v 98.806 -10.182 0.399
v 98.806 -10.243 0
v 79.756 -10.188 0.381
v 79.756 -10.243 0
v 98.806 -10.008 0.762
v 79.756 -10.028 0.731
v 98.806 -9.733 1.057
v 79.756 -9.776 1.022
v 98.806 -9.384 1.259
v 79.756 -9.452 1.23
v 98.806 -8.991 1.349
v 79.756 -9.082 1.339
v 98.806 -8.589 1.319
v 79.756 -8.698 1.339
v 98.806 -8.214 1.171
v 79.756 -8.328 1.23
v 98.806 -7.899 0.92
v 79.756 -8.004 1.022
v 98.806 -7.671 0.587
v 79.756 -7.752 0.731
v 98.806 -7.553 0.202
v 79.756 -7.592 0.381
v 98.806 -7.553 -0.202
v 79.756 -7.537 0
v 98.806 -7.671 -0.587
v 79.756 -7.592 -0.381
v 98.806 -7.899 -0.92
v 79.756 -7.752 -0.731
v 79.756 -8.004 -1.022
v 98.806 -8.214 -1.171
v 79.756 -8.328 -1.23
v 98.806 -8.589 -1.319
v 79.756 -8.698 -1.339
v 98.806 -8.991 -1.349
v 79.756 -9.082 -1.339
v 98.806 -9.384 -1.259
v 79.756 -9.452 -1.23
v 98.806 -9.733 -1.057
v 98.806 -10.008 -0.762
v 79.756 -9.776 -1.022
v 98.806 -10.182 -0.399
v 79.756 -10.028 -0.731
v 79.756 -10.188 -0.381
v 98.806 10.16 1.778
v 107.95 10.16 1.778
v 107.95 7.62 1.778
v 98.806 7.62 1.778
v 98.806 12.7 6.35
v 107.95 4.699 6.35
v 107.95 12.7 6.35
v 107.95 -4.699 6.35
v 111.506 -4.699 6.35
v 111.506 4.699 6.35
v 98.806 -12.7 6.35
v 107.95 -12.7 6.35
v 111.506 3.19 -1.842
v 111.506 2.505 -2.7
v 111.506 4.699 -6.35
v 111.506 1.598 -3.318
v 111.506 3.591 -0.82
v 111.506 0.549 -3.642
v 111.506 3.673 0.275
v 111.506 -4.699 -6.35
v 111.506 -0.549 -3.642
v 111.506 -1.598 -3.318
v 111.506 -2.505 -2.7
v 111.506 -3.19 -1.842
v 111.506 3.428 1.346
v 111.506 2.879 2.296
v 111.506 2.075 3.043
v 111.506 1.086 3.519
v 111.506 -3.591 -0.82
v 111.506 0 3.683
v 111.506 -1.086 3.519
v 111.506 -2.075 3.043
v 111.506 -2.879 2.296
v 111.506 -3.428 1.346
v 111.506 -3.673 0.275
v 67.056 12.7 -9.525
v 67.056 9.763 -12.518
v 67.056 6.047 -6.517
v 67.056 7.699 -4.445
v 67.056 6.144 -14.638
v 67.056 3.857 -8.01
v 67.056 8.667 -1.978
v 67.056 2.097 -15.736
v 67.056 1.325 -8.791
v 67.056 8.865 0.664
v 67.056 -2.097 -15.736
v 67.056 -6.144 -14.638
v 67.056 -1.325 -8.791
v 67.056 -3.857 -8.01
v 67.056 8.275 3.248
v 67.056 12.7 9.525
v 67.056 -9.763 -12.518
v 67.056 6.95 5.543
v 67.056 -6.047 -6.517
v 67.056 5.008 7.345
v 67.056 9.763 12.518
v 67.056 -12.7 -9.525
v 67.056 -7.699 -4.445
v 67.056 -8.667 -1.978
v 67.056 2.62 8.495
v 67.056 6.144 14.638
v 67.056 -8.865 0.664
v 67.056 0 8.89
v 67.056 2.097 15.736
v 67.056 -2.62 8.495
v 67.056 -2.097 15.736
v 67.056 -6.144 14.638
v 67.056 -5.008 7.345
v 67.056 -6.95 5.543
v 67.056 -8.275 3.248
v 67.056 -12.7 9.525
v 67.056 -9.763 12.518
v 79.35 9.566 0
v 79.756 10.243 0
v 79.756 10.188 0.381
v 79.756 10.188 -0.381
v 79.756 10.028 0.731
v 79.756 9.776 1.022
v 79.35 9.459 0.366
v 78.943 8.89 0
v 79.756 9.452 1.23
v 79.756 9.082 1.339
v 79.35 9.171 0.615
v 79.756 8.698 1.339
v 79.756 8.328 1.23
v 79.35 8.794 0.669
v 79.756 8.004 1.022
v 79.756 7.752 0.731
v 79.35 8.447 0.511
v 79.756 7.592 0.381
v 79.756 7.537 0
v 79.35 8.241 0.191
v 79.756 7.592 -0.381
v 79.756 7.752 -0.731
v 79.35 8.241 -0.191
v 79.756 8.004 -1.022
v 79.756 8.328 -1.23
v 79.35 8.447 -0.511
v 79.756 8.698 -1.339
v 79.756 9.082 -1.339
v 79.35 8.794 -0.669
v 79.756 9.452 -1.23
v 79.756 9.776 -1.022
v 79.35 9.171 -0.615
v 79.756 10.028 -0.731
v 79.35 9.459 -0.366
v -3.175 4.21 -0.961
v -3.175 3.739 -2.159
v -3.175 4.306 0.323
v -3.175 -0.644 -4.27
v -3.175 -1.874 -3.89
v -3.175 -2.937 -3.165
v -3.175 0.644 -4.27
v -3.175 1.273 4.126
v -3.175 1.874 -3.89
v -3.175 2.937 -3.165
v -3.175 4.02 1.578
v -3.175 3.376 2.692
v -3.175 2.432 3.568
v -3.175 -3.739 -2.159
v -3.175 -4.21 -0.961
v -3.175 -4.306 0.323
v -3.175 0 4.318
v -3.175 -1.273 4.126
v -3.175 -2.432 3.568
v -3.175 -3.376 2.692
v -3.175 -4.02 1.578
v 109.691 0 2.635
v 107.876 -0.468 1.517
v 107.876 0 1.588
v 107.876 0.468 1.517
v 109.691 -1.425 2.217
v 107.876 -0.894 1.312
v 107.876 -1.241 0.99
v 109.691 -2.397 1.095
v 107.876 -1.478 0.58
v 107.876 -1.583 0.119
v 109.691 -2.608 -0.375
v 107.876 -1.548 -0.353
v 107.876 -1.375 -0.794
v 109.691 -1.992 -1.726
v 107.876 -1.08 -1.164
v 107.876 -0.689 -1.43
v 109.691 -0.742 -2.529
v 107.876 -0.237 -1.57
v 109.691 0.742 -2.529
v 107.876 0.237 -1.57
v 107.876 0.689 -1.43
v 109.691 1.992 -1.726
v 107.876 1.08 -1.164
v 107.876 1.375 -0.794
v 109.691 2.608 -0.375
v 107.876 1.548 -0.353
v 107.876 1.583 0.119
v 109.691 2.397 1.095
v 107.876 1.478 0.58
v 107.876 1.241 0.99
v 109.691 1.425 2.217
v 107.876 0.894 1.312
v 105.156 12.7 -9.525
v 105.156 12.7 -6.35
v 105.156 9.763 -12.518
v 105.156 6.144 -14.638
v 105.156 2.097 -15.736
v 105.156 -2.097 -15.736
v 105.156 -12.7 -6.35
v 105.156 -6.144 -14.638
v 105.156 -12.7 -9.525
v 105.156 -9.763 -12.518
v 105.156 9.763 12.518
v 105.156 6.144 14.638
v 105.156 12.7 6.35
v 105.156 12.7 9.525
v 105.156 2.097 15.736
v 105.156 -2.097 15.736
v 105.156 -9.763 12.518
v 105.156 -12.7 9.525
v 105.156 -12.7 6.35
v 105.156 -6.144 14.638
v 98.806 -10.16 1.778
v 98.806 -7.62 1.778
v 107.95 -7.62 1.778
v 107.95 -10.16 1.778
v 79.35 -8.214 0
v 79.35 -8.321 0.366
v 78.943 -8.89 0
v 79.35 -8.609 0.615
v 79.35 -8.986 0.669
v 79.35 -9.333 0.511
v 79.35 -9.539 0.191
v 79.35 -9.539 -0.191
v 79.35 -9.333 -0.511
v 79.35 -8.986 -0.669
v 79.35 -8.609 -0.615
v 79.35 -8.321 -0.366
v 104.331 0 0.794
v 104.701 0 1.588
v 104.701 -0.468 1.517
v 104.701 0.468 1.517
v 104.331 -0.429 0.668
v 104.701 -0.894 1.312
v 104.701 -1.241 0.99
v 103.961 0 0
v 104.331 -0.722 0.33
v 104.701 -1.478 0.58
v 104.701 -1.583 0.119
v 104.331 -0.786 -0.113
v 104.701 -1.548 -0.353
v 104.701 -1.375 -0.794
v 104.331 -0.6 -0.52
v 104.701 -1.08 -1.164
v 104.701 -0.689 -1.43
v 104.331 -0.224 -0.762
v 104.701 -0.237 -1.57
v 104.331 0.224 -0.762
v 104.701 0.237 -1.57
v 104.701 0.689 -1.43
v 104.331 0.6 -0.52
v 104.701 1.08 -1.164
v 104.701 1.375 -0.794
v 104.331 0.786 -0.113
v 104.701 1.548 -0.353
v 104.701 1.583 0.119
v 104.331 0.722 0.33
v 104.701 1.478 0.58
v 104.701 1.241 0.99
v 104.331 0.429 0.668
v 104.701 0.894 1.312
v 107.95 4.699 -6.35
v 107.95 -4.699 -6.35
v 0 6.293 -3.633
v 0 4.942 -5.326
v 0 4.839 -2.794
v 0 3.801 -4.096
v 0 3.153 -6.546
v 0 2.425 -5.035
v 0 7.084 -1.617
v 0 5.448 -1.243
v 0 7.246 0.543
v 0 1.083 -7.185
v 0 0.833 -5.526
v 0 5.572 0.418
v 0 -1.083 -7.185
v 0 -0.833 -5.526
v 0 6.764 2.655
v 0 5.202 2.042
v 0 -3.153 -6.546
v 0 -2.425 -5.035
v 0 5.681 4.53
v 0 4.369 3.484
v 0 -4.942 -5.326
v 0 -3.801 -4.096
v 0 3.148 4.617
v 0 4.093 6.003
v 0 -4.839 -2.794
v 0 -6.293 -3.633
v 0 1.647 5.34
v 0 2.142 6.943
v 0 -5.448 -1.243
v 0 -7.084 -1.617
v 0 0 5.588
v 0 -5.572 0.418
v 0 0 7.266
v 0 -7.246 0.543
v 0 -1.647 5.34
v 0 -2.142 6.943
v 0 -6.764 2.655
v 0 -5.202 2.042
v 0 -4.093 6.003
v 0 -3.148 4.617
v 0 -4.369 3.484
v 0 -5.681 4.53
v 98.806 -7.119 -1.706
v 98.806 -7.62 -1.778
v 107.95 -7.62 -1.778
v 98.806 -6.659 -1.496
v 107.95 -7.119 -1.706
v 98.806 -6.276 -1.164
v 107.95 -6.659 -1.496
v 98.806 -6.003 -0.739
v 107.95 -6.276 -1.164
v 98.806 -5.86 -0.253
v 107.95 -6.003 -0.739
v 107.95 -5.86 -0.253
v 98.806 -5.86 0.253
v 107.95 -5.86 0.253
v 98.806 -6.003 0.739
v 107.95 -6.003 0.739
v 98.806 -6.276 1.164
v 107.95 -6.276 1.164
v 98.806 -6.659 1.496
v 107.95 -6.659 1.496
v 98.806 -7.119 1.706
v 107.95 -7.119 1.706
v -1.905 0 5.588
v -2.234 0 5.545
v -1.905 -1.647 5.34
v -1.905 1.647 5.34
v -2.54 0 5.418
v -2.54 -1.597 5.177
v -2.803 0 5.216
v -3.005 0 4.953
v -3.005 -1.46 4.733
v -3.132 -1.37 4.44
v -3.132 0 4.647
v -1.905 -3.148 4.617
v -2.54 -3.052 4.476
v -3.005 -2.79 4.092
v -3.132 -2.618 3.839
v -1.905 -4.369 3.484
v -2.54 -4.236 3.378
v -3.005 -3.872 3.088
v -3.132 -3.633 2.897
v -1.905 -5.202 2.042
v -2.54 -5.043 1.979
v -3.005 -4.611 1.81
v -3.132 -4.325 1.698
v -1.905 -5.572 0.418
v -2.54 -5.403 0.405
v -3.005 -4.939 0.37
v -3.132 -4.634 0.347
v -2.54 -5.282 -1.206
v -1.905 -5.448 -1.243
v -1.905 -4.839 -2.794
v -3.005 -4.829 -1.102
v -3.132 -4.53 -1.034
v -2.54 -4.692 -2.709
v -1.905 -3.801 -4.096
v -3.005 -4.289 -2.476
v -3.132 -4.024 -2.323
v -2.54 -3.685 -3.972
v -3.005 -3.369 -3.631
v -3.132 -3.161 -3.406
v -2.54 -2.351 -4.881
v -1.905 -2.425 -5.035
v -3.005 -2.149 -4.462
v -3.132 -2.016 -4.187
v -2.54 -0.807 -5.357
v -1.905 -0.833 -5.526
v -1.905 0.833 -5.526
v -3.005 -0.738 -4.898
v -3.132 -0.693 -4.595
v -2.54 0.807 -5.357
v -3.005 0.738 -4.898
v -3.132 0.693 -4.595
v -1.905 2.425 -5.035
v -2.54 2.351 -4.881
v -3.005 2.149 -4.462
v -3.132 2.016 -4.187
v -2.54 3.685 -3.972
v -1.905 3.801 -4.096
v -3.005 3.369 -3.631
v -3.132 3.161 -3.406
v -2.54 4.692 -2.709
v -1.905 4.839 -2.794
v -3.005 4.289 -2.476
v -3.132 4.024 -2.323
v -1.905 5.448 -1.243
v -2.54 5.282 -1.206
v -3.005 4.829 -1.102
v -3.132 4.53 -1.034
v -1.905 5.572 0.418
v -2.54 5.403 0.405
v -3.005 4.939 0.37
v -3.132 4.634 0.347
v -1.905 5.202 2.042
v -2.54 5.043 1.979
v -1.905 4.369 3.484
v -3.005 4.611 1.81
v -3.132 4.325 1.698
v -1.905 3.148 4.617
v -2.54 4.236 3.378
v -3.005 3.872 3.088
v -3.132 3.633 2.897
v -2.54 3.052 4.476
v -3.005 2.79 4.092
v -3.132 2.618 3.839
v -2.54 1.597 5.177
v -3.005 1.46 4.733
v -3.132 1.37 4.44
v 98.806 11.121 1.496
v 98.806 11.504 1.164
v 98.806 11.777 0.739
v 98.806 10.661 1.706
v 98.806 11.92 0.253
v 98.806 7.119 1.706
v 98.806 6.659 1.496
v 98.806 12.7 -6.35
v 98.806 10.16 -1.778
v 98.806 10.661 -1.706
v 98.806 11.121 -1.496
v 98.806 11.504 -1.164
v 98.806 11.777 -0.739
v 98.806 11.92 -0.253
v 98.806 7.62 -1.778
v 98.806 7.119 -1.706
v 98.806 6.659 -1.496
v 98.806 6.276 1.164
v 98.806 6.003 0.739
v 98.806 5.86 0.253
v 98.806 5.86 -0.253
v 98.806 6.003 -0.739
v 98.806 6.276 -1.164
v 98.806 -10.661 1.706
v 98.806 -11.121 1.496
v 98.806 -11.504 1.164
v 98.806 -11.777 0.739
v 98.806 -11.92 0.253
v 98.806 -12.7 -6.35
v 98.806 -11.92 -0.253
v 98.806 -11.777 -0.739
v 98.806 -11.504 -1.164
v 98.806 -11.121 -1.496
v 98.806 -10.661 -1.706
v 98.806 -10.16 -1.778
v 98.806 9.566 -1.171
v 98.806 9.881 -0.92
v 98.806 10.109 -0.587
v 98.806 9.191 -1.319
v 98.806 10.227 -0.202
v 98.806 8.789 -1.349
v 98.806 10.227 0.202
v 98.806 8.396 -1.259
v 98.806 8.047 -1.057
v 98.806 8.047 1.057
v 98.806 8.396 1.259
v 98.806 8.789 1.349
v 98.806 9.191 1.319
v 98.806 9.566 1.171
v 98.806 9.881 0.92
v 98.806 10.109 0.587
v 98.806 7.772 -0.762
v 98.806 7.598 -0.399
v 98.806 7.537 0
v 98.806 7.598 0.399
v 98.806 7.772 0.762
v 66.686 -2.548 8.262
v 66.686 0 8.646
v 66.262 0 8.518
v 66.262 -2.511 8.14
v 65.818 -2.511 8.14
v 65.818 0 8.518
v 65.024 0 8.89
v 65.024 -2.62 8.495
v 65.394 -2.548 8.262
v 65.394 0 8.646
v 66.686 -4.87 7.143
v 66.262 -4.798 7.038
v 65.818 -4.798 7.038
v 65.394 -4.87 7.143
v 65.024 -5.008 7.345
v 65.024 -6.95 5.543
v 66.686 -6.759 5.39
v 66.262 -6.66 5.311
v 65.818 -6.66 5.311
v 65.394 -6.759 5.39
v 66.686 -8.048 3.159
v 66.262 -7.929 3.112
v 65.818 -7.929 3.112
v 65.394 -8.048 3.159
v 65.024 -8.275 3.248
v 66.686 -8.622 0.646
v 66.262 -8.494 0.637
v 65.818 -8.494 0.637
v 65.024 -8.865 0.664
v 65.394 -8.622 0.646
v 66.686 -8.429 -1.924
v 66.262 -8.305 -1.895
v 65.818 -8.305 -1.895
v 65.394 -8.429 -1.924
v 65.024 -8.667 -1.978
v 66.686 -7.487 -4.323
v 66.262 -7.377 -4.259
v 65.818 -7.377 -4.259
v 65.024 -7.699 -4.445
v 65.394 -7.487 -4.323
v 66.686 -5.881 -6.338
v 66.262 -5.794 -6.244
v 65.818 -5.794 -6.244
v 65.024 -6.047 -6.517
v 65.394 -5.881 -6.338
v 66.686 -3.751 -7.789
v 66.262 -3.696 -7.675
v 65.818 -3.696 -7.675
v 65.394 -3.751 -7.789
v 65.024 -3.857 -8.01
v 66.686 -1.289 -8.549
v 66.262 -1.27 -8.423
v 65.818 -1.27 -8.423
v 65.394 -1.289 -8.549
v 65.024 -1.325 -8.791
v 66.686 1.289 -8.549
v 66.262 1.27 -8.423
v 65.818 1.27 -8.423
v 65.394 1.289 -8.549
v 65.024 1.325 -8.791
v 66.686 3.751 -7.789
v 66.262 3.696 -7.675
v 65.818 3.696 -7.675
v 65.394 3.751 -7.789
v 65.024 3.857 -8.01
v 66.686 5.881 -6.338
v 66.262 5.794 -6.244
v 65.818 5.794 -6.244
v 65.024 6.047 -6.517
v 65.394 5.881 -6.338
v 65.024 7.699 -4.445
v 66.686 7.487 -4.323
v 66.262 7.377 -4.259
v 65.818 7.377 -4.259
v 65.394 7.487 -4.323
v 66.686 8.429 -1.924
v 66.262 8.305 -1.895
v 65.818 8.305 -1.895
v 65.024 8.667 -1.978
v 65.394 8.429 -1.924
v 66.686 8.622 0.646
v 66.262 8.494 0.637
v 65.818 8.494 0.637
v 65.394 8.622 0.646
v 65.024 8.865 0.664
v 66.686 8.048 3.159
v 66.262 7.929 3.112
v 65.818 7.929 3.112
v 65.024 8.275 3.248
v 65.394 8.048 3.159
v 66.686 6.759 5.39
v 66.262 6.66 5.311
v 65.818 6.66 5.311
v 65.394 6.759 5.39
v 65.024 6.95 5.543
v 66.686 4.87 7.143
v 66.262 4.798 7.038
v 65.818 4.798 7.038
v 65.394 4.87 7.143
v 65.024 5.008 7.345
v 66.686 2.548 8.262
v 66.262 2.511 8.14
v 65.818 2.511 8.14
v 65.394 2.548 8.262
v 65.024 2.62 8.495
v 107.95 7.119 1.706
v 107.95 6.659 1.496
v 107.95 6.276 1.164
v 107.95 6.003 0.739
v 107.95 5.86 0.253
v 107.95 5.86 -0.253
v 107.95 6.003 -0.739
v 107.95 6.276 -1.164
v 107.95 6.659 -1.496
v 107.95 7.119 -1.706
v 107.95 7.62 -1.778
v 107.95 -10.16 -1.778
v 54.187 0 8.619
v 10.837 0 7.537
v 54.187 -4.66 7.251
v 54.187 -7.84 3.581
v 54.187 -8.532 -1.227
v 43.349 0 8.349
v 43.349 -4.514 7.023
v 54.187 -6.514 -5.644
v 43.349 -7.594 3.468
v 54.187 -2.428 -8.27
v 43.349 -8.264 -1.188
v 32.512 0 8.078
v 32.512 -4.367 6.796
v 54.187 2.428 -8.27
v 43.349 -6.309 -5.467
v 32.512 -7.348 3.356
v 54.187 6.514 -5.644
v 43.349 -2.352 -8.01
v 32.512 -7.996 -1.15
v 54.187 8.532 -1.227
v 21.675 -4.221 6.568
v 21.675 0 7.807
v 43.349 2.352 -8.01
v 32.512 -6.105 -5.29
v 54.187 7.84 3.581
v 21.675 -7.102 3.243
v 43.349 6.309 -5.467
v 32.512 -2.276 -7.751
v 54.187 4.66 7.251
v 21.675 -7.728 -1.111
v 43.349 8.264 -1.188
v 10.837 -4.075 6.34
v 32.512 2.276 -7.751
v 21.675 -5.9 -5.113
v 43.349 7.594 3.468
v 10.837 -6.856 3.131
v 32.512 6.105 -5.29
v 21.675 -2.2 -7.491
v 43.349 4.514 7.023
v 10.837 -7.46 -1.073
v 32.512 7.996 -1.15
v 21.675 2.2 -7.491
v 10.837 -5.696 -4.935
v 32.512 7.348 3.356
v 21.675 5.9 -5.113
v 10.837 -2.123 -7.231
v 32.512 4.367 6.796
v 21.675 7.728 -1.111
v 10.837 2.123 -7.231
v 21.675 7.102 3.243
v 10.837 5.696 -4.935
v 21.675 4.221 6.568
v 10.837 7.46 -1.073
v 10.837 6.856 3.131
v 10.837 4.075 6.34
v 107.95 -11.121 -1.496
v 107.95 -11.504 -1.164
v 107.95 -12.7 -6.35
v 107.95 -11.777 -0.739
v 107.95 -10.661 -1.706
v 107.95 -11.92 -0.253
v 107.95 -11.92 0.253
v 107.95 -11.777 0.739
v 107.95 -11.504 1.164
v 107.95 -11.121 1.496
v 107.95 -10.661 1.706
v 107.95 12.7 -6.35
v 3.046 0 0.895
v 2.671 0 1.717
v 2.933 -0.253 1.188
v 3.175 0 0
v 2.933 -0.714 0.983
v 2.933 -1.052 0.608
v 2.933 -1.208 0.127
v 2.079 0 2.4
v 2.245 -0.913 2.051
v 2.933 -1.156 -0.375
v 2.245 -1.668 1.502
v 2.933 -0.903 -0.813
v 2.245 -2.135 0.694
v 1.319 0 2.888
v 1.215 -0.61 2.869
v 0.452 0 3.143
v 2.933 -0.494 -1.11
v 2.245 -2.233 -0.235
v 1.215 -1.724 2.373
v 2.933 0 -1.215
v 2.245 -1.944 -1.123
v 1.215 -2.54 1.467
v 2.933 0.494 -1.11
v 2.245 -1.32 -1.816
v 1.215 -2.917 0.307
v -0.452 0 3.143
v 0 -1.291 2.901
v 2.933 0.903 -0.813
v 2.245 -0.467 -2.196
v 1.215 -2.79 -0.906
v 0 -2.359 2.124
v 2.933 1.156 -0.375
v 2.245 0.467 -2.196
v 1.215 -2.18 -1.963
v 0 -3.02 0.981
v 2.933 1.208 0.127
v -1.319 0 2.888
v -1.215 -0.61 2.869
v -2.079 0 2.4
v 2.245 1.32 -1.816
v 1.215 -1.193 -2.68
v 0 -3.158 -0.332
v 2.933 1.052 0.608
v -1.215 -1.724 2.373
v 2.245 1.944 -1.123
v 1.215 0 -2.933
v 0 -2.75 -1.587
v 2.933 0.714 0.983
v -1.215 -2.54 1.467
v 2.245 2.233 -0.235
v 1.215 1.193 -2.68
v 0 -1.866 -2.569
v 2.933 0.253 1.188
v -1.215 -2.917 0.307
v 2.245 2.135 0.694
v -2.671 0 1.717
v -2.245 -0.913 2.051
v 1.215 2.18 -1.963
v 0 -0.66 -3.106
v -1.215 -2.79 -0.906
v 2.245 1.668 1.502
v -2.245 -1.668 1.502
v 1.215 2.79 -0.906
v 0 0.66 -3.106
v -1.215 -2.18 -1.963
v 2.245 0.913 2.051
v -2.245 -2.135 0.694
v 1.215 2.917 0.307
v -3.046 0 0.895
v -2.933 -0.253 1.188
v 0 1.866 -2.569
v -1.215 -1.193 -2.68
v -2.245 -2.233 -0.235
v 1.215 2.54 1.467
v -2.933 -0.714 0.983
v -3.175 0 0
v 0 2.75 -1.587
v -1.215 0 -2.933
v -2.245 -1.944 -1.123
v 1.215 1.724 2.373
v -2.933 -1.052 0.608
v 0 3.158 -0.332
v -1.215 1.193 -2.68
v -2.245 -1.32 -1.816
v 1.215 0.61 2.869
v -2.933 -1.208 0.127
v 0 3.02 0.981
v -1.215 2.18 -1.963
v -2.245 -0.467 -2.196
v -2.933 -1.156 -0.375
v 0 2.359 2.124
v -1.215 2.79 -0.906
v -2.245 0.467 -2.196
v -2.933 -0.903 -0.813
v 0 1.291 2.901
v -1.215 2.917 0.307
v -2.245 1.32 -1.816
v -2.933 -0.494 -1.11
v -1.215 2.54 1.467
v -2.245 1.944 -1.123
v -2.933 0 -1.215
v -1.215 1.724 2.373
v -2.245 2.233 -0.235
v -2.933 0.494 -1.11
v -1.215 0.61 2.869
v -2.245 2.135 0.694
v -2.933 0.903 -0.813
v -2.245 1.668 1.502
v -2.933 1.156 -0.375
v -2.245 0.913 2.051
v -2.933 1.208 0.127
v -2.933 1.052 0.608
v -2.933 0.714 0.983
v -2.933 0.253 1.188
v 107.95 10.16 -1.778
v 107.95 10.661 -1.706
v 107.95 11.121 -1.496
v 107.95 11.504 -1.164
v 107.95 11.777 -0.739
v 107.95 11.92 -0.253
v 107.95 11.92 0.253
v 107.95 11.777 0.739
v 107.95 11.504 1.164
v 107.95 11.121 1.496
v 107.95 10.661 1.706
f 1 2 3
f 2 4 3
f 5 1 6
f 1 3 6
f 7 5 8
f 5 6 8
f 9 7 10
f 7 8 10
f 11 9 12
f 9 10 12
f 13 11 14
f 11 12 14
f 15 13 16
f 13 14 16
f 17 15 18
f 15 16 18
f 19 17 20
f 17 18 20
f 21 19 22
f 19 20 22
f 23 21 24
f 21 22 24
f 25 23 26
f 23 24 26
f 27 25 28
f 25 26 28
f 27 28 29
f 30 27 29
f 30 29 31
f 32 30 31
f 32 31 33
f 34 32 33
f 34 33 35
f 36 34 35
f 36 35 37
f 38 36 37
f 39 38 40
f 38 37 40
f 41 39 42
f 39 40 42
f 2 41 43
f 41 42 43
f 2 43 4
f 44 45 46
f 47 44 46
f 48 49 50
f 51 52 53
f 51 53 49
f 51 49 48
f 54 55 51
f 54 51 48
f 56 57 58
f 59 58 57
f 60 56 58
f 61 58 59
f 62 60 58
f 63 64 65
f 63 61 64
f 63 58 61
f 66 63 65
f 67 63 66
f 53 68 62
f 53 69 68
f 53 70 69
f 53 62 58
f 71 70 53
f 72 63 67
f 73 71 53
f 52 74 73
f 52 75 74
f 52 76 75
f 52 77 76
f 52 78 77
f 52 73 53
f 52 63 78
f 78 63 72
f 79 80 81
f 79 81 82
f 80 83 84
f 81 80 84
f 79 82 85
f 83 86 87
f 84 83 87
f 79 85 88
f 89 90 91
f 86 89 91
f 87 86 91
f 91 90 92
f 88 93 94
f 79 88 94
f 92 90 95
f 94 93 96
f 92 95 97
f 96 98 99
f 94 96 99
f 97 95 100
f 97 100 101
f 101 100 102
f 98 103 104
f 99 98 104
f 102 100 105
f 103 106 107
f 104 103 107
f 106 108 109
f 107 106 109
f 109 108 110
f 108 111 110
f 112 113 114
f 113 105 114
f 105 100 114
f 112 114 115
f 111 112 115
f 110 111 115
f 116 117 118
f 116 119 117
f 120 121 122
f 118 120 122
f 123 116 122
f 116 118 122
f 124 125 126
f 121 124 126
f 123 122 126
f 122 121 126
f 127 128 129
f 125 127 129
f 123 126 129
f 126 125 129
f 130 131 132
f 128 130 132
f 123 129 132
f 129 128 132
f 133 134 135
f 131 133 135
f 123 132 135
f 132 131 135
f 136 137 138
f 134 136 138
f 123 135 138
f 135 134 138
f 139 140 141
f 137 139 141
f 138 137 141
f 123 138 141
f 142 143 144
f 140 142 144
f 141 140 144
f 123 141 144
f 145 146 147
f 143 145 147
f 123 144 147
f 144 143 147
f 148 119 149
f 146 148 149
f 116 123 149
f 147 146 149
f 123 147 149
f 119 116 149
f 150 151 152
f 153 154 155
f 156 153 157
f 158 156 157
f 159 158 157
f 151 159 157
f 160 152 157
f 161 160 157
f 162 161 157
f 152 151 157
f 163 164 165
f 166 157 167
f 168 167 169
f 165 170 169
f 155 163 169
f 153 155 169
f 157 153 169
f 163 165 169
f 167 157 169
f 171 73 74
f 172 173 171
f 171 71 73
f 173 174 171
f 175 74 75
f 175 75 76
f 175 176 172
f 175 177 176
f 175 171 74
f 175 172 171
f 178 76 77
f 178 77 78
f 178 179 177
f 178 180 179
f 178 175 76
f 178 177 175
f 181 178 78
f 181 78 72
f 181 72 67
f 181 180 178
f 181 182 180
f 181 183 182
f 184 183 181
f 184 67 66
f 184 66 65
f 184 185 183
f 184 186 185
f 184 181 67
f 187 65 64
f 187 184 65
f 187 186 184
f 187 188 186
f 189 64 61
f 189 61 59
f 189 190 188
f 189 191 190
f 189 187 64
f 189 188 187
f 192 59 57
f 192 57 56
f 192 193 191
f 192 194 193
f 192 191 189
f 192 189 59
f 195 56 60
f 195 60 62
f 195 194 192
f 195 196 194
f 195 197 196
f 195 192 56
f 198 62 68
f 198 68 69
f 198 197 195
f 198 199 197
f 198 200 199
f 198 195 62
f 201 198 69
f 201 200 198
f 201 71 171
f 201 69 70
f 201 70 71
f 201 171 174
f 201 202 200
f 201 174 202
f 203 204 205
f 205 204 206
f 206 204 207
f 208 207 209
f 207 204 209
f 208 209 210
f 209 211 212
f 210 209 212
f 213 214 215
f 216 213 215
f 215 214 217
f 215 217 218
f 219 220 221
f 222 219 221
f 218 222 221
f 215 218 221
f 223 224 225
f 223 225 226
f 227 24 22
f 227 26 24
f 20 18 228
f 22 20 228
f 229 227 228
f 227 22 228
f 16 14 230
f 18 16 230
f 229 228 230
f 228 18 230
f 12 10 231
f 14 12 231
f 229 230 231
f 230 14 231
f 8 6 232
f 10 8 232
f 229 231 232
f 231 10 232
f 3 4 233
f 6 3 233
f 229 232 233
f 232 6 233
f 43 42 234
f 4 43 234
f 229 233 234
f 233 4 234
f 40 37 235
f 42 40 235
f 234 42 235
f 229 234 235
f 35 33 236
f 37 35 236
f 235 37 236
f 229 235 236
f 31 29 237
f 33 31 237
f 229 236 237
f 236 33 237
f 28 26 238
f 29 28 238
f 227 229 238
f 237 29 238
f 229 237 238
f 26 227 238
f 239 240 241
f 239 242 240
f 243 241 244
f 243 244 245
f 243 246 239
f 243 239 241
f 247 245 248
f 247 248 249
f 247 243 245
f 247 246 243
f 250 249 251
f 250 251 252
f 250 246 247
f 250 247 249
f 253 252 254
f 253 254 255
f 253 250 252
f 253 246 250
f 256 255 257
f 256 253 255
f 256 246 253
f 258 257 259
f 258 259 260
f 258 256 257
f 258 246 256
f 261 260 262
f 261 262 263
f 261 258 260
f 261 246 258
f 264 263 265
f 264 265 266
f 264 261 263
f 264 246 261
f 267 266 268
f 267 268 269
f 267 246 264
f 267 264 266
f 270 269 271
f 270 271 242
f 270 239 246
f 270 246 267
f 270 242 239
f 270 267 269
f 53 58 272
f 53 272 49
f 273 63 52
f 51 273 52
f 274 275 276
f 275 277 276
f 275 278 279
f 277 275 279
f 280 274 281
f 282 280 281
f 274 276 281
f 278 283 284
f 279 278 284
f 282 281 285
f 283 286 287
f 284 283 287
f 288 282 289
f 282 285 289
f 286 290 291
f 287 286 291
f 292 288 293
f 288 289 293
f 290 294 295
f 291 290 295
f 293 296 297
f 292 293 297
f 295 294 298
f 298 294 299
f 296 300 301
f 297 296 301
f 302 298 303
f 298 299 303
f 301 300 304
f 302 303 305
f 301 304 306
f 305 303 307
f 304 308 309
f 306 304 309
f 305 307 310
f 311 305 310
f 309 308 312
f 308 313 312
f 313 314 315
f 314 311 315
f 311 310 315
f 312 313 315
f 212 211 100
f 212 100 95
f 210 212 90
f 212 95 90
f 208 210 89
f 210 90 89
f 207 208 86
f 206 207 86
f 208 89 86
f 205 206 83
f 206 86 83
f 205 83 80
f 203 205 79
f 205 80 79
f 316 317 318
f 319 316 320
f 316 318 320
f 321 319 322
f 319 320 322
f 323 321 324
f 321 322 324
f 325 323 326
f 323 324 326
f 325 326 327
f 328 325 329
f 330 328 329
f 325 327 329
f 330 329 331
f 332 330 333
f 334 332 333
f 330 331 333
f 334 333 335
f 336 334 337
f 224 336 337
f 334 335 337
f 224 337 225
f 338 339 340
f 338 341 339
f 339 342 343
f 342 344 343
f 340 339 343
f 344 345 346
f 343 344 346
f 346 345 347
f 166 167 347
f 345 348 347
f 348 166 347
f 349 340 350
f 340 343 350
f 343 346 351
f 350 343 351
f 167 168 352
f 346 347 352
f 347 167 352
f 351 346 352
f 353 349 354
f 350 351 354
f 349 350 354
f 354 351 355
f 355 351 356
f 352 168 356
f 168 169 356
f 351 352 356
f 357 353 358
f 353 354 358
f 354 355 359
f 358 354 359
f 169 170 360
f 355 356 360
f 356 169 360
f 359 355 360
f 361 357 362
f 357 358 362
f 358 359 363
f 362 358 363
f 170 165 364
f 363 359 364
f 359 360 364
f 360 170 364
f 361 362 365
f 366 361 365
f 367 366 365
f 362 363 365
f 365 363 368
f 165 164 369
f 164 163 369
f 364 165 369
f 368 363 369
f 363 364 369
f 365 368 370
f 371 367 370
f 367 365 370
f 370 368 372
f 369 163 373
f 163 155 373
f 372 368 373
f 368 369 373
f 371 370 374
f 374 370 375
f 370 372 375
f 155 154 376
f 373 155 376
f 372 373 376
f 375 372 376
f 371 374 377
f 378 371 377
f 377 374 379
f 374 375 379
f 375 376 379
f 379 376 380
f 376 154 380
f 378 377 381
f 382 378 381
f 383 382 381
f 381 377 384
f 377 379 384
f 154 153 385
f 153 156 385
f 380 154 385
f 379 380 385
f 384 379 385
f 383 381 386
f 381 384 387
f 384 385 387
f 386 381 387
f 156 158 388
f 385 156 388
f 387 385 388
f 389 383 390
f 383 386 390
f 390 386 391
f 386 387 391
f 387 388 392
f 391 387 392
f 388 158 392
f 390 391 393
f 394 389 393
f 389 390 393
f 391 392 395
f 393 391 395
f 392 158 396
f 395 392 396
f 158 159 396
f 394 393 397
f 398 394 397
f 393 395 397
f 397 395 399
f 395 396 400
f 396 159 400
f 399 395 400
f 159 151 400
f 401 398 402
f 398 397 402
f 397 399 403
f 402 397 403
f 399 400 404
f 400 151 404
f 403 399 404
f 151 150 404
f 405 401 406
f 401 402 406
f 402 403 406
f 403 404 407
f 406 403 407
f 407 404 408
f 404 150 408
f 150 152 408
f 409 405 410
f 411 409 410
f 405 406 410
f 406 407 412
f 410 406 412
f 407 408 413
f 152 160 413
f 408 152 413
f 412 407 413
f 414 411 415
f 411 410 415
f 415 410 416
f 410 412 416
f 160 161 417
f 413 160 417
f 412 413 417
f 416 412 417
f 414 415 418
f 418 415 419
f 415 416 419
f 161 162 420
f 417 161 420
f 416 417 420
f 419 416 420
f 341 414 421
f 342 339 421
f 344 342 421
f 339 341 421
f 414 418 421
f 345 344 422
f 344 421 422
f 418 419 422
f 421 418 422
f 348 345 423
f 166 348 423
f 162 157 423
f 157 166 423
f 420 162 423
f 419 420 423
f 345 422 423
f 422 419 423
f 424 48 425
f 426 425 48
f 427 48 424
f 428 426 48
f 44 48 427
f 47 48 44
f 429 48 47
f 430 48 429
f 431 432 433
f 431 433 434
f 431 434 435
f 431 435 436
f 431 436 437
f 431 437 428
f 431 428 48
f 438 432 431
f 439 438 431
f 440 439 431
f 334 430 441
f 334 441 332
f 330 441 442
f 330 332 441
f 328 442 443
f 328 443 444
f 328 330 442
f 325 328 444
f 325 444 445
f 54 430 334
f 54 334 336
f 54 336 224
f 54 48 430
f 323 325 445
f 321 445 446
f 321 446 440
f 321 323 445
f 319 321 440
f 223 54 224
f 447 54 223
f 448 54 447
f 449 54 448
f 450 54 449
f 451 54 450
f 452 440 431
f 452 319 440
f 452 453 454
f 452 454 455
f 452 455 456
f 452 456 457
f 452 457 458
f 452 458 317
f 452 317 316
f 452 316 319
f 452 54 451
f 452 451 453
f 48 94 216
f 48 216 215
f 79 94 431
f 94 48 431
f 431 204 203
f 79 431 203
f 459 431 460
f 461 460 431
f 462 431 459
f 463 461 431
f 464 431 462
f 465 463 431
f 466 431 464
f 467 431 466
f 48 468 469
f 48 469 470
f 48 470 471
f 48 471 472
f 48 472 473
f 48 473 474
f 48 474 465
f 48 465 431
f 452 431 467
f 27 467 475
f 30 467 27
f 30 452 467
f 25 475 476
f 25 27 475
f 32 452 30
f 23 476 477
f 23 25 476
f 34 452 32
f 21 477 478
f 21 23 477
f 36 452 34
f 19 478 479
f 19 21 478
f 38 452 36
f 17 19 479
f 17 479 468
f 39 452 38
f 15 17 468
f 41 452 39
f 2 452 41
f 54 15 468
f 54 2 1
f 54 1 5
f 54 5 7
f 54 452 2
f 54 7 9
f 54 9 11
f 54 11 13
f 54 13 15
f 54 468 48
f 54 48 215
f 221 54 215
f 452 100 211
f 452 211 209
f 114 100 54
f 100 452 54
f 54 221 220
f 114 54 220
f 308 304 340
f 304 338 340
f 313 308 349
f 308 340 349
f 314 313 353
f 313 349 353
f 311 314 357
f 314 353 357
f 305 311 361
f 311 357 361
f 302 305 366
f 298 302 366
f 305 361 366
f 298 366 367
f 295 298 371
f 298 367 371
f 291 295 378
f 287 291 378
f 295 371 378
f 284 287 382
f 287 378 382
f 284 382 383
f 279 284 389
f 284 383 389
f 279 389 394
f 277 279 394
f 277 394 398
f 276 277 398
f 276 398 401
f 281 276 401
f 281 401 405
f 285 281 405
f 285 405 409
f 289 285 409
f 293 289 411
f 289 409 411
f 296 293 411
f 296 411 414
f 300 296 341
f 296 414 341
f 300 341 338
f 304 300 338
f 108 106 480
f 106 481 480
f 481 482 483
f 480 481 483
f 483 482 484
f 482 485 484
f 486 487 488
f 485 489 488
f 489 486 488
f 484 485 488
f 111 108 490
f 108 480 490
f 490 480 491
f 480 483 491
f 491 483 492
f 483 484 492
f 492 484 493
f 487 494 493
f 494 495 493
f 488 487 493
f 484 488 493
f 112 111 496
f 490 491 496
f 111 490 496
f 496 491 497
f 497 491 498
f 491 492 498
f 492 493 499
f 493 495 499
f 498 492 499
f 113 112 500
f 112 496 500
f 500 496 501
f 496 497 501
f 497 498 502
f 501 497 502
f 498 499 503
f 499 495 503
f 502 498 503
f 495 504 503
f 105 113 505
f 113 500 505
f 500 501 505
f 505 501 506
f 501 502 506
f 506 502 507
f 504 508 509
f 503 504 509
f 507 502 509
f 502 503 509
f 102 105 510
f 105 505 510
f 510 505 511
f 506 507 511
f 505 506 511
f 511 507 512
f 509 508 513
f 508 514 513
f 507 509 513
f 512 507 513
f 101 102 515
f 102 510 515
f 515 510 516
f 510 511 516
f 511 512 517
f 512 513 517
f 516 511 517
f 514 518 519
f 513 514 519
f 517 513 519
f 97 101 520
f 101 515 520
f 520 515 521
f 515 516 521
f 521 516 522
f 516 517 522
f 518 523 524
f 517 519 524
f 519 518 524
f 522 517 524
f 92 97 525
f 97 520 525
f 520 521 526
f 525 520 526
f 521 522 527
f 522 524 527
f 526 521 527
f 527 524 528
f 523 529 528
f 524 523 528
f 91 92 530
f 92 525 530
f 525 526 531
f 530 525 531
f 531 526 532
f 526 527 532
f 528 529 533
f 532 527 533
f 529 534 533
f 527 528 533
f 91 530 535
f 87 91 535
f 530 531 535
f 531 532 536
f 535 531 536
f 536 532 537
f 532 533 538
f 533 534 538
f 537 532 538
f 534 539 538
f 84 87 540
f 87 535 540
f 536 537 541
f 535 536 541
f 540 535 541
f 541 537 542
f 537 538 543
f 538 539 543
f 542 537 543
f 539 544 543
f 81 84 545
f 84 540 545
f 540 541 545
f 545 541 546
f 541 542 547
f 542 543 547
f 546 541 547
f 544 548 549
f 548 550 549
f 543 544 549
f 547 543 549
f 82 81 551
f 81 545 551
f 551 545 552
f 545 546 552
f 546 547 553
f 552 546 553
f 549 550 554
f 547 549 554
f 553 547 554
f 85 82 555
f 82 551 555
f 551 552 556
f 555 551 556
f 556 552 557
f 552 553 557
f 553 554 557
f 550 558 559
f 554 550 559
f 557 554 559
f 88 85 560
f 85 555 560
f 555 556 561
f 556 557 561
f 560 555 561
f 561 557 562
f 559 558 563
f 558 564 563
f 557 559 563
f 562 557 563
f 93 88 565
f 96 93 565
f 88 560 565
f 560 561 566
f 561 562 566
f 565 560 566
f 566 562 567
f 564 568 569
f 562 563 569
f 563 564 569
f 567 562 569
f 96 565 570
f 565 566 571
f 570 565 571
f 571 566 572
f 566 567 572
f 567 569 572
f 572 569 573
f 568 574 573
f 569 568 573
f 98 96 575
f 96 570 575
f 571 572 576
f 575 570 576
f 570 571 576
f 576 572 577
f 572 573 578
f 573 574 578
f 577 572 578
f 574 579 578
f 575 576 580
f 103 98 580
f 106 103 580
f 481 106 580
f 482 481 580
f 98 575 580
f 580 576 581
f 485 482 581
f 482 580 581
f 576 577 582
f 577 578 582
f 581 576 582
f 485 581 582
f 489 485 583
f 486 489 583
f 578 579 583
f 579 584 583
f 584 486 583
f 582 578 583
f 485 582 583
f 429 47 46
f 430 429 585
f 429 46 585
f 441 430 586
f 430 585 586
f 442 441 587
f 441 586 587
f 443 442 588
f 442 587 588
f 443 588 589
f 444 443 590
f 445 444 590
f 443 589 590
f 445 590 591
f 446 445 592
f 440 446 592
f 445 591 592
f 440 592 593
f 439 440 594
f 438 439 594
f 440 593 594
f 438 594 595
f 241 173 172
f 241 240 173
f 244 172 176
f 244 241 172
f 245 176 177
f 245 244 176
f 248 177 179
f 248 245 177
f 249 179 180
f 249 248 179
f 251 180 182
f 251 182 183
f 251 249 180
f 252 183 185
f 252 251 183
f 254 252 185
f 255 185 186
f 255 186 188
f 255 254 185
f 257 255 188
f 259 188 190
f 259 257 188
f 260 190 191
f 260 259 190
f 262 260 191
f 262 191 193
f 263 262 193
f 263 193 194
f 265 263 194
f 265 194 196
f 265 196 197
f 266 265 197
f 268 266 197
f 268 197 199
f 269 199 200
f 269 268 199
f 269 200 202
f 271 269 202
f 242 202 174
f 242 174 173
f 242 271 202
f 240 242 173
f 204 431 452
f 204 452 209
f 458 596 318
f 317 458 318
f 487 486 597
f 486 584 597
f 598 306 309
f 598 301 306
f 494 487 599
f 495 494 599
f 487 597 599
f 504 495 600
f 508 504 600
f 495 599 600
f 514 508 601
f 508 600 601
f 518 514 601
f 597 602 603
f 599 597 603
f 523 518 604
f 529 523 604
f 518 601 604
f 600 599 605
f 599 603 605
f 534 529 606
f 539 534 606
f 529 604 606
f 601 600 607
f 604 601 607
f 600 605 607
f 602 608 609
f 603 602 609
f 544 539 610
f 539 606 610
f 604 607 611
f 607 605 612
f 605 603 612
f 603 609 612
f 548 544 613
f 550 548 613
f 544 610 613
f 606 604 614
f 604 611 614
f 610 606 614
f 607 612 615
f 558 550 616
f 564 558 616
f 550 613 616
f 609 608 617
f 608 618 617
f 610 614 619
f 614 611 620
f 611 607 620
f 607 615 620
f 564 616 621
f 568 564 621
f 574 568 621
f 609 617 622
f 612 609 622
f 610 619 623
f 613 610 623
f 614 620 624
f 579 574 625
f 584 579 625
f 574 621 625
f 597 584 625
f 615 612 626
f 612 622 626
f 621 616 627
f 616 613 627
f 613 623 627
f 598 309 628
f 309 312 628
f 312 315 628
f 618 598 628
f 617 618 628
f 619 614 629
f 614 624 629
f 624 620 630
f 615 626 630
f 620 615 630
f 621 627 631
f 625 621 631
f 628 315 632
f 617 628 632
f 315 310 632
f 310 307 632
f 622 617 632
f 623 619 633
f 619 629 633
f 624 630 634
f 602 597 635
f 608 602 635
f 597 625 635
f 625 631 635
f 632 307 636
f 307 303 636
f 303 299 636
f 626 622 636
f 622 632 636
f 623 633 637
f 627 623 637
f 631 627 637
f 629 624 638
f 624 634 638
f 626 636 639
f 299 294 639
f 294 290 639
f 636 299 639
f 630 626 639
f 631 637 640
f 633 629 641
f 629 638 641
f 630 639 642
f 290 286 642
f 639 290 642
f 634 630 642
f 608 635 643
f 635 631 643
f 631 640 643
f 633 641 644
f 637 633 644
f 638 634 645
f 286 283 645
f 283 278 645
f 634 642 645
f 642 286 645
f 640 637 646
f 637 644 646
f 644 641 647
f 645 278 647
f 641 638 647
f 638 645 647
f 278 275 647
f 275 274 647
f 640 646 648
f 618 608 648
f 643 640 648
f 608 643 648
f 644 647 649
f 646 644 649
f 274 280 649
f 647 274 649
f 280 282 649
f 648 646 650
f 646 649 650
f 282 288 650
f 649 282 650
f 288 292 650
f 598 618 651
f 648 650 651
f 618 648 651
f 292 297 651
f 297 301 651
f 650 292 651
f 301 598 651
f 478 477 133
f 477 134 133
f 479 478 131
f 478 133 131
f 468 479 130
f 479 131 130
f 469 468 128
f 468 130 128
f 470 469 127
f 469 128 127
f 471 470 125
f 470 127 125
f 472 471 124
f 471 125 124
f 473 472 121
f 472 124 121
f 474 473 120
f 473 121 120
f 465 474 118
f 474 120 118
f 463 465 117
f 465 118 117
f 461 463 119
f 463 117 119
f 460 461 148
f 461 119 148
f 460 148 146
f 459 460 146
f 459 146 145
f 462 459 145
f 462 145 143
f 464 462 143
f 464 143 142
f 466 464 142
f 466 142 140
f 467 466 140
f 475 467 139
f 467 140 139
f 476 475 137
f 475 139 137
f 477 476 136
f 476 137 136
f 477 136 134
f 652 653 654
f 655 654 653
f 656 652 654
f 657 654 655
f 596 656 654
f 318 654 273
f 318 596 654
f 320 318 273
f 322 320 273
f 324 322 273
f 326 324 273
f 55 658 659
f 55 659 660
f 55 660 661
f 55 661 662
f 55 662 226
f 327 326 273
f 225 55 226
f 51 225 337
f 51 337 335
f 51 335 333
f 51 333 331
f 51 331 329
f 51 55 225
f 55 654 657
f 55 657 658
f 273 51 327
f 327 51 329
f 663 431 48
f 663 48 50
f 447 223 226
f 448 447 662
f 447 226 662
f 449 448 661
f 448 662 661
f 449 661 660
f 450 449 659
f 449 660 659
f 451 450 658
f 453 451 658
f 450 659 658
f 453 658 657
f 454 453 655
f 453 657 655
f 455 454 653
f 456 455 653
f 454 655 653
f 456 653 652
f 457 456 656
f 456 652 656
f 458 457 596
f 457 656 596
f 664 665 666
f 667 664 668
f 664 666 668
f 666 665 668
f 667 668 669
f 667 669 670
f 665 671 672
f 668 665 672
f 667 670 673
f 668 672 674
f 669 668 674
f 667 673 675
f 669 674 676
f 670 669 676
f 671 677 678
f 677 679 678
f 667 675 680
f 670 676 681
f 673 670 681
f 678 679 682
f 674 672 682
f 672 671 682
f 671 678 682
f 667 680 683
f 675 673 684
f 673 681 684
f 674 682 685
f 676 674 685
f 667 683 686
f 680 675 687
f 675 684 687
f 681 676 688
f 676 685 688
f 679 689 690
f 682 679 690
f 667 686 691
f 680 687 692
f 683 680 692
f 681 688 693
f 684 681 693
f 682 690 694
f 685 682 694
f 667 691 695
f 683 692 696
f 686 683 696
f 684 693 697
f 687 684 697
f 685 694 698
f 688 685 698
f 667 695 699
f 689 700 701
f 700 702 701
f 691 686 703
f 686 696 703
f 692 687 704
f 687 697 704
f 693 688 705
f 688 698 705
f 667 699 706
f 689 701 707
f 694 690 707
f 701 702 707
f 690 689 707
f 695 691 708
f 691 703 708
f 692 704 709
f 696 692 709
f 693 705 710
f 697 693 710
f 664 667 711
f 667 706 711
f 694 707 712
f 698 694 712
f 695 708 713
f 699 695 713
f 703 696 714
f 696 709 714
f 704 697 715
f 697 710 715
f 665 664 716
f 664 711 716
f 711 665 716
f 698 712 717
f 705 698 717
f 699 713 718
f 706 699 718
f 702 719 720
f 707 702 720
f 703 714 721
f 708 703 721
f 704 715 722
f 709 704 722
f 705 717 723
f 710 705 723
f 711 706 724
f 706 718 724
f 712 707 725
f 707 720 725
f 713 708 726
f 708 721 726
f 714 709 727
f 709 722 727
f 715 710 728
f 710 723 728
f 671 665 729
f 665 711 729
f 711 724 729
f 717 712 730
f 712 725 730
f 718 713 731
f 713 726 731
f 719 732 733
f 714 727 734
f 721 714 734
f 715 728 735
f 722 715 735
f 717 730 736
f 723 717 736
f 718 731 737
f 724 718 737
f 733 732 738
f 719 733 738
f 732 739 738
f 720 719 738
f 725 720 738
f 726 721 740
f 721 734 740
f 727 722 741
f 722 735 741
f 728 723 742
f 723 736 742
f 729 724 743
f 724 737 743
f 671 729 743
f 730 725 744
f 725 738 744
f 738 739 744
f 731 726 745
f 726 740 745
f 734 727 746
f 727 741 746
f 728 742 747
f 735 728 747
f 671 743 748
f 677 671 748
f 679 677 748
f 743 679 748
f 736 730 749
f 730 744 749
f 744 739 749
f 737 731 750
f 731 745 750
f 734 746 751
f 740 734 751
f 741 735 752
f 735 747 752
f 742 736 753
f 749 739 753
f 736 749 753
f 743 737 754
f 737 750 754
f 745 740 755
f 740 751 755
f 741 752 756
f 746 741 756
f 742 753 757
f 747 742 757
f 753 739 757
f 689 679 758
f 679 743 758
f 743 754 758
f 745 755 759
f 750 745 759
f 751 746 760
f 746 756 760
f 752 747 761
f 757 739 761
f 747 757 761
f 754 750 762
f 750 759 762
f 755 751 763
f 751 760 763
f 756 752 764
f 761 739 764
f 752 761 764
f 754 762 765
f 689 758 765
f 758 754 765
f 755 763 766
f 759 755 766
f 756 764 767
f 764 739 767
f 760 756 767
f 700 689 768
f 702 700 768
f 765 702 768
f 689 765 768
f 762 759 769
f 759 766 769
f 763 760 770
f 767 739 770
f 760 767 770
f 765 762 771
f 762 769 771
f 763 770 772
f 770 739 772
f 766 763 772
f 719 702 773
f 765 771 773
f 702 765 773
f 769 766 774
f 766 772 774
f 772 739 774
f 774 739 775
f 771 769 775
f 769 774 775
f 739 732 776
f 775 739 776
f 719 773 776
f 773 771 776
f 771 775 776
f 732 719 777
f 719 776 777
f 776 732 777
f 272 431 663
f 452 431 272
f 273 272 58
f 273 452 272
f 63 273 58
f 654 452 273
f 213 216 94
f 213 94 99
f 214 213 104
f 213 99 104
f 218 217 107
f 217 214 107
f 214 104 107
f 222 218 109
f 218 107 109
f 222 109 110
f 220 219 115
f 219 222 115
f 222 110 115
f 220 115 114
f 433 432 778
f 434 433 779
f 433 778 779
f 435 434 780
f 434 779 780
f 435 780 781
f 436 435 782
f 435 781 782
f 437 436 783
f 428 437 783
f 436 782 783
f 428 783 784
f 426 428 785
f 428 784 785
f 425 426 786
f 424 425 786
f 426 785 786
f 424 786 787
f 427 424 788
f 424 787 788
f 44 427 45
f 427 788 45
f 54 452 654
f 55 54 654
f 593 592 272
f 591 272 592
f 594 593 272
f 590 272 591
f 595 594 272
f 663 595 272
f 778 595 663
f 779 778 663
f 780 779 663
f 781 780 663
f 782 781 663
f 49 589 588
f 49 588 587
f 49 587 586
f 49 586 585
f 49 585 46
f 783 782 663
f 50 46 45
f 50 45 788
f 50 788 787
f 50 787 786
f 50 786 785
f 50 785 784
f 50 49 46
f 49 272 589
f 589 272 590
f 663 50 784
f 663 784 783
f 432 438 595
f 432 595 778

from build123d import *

# Parameters (mm, degrees)
F2_W      = 6.35
F2_H      = 12.7
F3_DEPTH  = 25.4
F6_DEPTH  = 38.1
F8_D      = 2.7051
F8_DEPTH  = 19.05
F8_TIP    = 0.8126940303
F9_DEPTH  = 12.7
F11_DEPTH = 25.4
F13_W     = 8.001
F13_H     = 12.7
F14_DEPTH = 3.556


# Not quite as in the source:
# - a feature names something its author has since deleted; it is built from what else it names


with BuildPart() as f1:
    # F0 (on Front) → F1 (revolve)
    with BuildSketch(Plane.XZ):
        Polygon((0, 5.588), (0, 0), (65.024, 0), (65.024, 8.89), (0, 7.2659854949), align=None)
        with BuildLine():
            Line((-3.175, 0), (0, 0))
            Line((0, 0), (0, 5.588))
            Line((0, 5.588), (-1.905, 5.588))
            ThreePointArc((-1.905, 5.588), (-2.8030256121, 5.2160256121), (-3.175, 4.318))
            Line((-3.175, 4.318), (-3.175, 0))
        make_face()
        with BuildLine():
            Line((65.024, 8.89), (65.024, 0))
            Line((65.024, 0), (67.056, 0))
            Line((67.056, 0), (67.056, 8.89))
            ThreePointArc((67.056, 8.89), (66.04, 8.5019225326), (65.024, 8.89))
        make_face()
        with BuildLine():
            Line((67.056, 8.89), (67.056, 0))
            Line((67.056, 0), (105.156, 0))
            Line((105.156, 0), (105.156, 15.875))
            Line((105.156, 15.875), (67.056, 15.875))
            Line((67.056, 15.875), (67.056, 11.1618450651))
            ThreePointArc((67.056, 11.1618450651), (67.4312152961, 10.6480929272), (67.564, 10.0259225326))
            ThreePointArc((67.564, 10.0259225326), (67.4312152961, 9.4037521379), (67.056, 8.89))
        make_face()
        with BuildLine():
            Line((67.056, 11.1618450651), (67.056, 8.89))
            ThreePointArc((67.056, 8.89), (67.4312152961, 9.4037521379), (67.564, 10.0259225326))
            ThreePointArc((67.564, 10.0259225326), (67.4312152961, 10.6480929272), (67.056, 11.1618450651))
        make_face()
    revolve(axis=Axis((32.512, 0, 0), (1, 0, 0)))

    # F2 (on Front) → F3 (cut, symmetric)
    with BuildSketch(Plane.XZ):
        with Locations((101.981, 0)):
            Rectangle(F2_W, F2_H)
    extrude(amount=F3_DEPTH, both=True, mode=Mode.SUBTRACT)

    # F4 (on face) → F6 (cut)
    with BuildSketch(Plane.YZ.offset(105.156)):
        with BuildLine():
            Line((-12.7, 6.35), (-14.5496778315, 6.35))
            ThreePointArc((-14.5496778315, 6.35), (-15.875, 0), (-14.5496778315, -6.35))
            ThreePointArc((-14.5496778315, -6.35), (-13.7170110348, -7.9911972363), (-12.7, -9.525))
            Line((-12.7, -9.525), (-12.7, 6.35))
        make_face()
        with BuildLine():
            ThreePointArc((-12.7, 9.525), (-13.7170110348, 7.9911972363), (-14.5496778315, 6.35))
            Line((-14.5496778315, 6.35), (-12.7, 6.35))
            Line((-12.7, 6.35), (-12.7, 9.525))
        make_face()
        with BuildLine():
            Line((14.5496778315, 6.35), (12.7, 6.35))
            Line((12.7, 6.35), (12.7, -9.525))
            ThreePointArc((12.7, -9.525), (13.7170110348, -7.9911972363), (14.5496778315, -6.35))
            ThreePointArc((14.5496778315, -6.35), (15.875, 0), (14.5496778315, 6.35))
        make_face()
        with BuildLine():
            Line((12.7, 9.525), (12.7, 6.35))
            Line((12.7, 6.35), (14.5496778315, 6.35))
            ThreePointArc((14.5496778315, 6.35), (13.7170110348, 7.9911972363), (12.7, 9.525))
        make_face()
    extrude(amount=-F6_DEPTH, mode=Mode.SUBTRACT)

    # F8
    with Locations(Plane.YZ.offset(98.806)):
        with Locations((-8.89, 0), (8.89, 0)):
            Hole(F8_D / 2, depth=F8_DEPTH)
            with Locations((0, 0, -(F8_DEPTH + F8_TIP / 2))):  # 118° drill point
                Cone(0, F8_D / 2, F8_TIP, mode=Mode.SUBTRACT)


with BuildPart() as f9:
    # F5 (on Front) → F9 (new body, symmetric)
    with BuildSketch(Plane.XZ):
        Polygon((98.806, 6.35), (98.806, -6.35), (111.506, -6.35), (111.506, -3.683), (111.506, 0), (103.9612241254, 0), (104.7014875327, 1.5875), (107.8764875327, 1.5875), (111.506, 3.683), (111.506, 6.35), align=None)
        Polygon((103.9612241254, 0), (111.506, 0), (111.506, 3.683), (107.8764875327, 1.5875), (104.7014875327, 1.5875), align=None)
    extrude(amount=F9_DEPTH, both=True)

    # F10 (on face) → F11 (cut)
    with BuildSketch(Plane.YZ.offset(111.506)):
        with BuildLine():
            ThreePointArc((7.62, 1.778), (5.842, 0), (7.62, -1.778))
            Line((7.62, -1.778), (10.16, -1.778))
            ThreePointArc((10.16, -1.778), (11.938, 0), (10.16, 1.778))
            Line((10.16, 1.778), (7.62, 1.778))
        make_face()
        with BuildLine():
            ThreePointArc((-10.16, 1.778), (-11.938, 0), (-10.16, -1.778))
            Line((-10.16, -1.778), (-7.62, -1.778))
            ThreePointArc((-7.62, -1.778), (-5.842, 0), (-7.62, 1.778))
            Line((-7.62, 1.778), (-10.16, 1.778))
        make_face()
    extrude(amount=-F11_DEPTH, mode=Mode.SUBTRACT)

    # F5 (on Front) → F12 (revolve, cut)
    with BuildSketch(Plane.XZ):
        Polygon((103.9612241254, 0), (111.506, 0), (111.506, 3.683), (107.8764875327, 1.5875), (104.7014875327, 1.5875), align=None)
    revolve(axis=Axis((107.7336120627, 0, 0), (1, 0, 0)), mode=Mode.SUBTRACT)

    # F13 (on face) → F14 (cut)
    with BuildSketch(Plane.YZ.offset(111.506)):
        with Locations((8.6995, 0)):
            Rectangle(F13_W, F13_H)
        with BuildLine():
            ThreePointArc((7.62, -1.778), (5.842, 0), (7.62, 1.778))
            Line((7.62, 1.778), (10.16, 1.778))
            ThreePointArc((10.16, 1.778), (11.938, 0), (10.16, -1.778))
            Line((10.16, -1.778), (7.62, -1.778))
        make_face(mode=Mode.SUBTRACT)
        with Locations((-8.6995, 0)):
            Rectangle(F13_W, F13_H)
        with BuildLine():
            Line((-7.62, -1.778), (-10.16, -1.778))
            ThreePointArc((-10.16, -1.778), (-11.938, 0), (-10.16, 1.778))
            Line((-10.16, 1.778), (-7.62, 1.778))
            ThreePointArc((-7.62, 1.778), (-5.842, 0), (-7.62, -1.778))
        make_face(mode=Mode.SUBTRACT)
    extrude(amount=-F14_DEPTH, mode=Mode.SUBTRACT)


with BuildPart() as f16:
    # F15 (on Front) → F16 (revolve)
    with BuildSketch(Plane.XZ):
        with BuildLine():
            Line((-3.175, 0), (3.175, 0))
            ThreePointArc((3.175, 0), (0, 3.175), (-3.175, 0))
        make_face()
    revolve(axis=Axis((0, 0, 0), (1, 0, 0)))


solid = Compound([f1.part, f9.part, f16.part])
